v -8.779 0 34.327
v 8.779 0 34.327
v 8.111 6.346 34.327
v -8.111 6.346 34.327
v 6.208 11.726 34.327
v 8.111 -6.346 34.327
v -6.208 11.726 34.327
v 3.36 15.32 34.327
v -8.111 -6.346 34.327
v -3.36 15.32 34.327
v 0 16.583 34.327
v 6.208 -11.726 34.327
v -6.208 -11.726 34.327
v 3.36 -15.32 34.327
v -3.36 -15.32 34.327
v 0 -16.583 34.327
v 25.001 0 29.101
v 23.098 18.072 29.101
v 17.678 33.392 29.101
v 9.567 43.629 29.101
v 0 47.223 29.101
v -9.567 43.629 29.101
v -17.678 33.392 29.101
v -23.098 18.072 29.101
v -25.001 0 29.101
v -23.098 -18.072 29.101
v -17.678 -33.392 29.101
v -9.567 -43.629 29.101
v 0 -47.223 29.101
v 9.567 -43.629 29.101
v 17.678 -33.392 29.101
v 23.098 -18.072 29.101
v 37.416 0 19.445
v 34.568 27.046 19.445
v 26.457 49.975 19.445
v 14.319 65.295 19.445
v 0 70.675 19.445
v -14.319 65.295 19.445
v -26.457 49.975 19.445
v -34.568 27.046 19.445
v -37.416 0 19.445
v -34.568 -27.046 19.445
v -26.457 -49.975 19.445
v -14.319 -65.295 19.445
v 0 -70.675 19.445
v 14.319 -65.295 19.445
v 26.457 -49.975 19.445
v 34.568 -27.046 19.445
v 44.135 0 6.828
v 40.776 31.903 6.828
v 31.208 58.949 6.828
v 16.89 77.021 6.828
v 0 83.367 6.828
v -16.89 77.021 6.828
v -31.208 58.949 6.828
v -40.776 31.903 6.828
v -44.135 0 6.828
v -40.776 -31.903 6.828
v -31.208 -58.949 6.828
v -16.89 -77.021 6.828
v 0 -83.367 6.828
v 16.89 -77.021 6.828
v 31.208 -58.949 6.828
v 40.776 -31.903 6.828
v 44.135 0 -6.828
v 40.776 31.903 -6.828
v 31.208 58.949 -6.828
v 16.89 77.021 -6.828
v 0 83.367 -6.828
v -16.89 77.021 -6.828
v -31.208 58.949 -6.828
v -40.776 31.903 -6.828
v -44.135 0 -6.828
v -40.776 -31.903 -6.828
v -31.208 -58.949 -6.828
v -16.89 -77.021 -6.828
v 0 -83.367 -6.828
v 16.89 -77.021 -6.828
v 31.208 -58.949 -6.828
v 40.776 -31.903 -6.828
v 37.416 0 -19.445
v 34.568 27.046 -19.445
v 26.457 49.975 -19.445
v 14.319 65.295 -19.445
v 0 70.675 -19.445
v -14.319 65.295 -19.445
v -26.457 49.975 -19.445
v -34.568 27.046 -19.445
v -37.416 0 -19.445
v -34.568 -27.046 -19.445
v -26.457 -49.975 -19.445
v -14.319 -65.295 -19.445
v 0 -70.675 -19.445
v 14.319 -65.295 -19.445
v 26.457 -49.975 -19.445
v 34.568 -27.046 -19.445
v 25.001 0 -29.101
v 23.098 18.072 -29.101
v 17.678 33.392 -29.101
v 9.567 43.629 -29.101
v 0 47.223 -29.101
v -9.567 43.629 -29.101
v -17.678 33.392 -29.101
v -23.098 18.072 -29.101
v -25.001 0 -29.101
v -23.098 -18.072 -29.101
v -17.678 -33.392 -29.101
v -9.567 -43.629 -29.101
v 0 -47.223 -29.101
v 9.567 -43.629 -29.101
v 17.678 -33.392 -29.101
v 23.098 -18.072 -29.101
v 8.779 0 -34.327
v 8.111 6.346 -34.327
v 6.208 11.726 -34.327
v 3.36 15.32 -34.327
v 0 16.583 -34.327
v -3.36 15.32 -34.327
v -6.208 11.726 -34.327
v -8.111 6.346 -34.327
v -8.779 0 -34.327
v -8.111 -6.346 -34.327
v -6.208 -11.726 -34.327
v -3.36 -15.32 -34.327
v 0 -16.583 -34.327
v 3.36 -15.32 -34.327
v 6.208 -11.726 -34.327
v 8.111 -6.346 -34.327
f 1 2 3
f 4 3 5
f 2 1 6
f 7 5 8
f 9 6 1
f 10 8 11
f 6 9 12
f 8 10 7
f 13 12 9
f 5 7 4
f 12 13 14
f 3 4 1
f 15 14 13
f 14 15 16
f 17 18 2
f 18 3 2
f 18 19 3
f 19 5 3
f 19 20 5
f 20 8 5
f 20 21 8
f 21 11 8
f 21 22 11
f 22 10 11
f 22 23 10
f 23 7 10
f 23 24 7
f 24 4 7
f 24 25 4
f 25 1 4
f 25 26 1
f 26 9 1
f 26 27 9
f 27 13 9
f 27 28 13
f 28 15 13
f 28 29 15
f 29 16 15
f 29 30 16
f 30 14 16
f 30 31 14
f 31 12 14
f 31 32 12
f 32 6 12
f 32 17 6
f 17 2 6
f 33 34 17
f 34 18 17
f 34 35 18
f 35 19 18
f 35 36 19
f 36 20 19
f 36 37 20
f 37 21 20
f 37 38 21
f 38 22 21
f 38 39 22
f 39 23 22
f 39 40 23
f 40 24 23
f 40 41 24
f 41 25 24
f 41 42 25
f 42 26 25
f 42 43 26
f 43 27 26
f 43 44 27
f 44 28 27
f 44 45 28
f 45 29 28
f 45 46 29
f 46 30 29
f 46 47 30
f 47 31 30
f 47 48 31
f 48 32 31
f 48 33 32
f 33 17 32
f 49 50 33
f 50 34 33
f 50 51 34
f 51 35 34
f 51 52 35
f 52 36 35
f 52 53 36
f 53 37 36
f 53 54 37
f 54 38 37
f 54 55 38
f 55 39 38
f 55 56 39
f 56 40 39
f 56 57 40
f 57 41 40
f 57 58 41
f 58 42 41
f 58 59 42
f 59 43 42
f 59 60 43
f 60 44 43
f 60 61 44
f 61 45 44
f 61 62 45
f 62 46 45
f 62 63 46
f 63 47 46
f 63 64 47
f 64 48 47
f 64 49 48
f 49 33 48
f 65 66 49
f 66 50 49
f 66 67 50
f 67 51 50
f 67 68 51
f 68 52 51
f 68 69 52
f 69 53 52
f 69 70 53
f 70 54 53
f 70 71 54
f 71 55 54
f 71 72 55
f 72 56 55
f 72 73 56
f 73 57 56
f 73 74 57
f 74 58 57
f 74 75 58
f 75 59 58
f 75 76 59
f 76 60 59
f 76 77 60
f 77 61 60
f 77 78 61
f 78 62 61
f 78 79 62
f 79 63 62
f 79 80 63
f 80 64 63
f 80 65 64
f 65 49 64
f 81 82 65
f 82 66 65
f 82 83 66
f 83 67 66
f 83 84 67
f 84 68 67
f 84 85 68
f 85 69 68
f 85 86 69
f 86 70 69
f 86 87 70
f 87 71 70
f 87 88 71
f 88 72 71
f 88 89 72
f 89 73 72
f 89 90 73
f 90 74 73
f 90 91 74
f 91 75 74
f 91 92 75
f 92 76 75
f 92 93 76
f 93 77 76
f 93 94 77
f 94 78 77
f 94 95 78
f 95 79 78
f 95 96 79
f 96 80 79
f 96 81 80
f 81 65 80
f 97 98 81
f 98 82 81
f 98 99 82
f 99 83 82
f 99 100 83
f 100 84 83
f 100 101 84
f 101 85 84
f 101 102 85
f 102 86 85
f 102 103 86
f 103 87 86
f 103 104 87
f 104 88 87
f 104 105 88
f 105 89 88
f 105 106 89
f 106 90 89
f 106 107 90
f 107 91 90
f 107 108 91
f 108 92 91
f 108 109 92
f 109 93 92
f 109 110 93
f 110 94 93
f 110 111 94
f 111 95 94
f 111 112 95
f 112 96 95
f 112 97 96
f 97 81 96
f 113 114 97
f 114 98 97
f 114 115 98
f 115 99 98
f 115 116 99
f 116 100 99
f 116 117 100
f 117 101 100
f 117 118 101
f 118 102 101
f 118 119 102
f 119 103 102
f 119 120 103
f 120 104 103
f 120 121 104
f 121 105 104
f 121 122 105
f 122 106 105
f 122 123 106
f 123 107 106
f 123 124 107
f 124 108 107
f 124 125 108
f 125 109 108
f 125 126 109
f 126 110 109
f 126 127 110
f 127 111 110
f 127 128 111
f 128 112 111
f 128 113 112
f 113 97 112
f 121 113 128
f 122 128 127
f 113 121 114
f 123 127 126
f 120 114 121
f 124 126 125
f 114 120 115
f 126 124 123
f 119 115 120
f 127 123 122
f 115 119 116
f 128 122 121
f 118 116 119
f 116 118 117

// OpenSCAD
// Generated by SolidPython 1.0.1 on 2020-07-29 00:46:49


scale(v = [9, 17, 7]) {
	sphere(r = 5);
}
/***********************************************
*********      SolidPython code:      **********
************************************************
 
# import packages: SolidPython
from solid import *
from solid.utils import *
from itertools import chain, combinations, permutations


class Resize:

    def __init__(self, scad_file):
        self.scad_file = scad_file
        #self.scad_file = import_scad(scad_file)
        # cone/cylinder param:
        self.r1 = 0
        self.r2 = 0
        self.h = 0
        # rectangular prism param:
        self.w = 0
        self.l = 0
        # ellipse param:
        self.r = 0

    # import OpenScad code (file name corresponds to shape)


    # classify shape + parameters
    def assign(self, param1, param2, param3):
        if self.scad_file == 'cone.scad':
            self.r1 = param1
            self.r2 = param2
            self.h = param3
        elif self.scad_file == 'cylinder.scad':
            self.r1 = param1
            self.r2 = param2
            self.h = param3
        elif self.scad_file == 'rectangularPrism.scad':
            self.h = param1
            self.l = param2
            self.w = param3
        else:
            self.r = param1
            self.h = param2

    # resize parameters
    def iterate(self):
        x = range(3, 20, 2)
        i = 1
        if self.scad_file == 'cone.scad':
            tempList = list(permutations(x, 2))
            for temp in tempList:
                param1 = temp[0]
                param2 = temp[1]
                filepath = 'produced_scad_files/' + 'cone' + str(param1) + '_' + str(param2) + '_' + '.scad'
                scad_render_to_file(cylinder(h=param1, r1=param2, r2=0), filepath)

        elif self.scad_file == 'cylinder.scad':
            tempList = list(permutations(x, 3))
            for temp in tempList:
                param1 = temp[0]
                param2 = temp[1]
                filepath = 'produced_scad_files/' + 'cylinder' + str(param1) + '_' + str(param2) + '_' + '.scad'
                scad_render_to_file(cylinder(h=param1, r1=param2, r2=param2), filepath)

        elif self.scad_file == 'rectangularPrism.scad':
            tempList = list(permutations(x, 3))
            for temp in tempList:
                param1 = temp[0]
                param2 = temp[1]
                param3 = temp[2]
                filepath = 'produced_scad_files/' + 'rectangularPrism' + str(param1) + '_' + str(param2) + '_' + str(
                    param3) + '.scad'
                scad_render_to_file(cube(size=(param1, param2, param3)), filepath)

        elif self.scad_file == 'ellipse.scad':
            tempList = list(permutations(x, 4))
            for temp in tempList:
                param1 = temp[0]
                param2 = temp[1]
                param3 = temp[2]
                param4 = temp[3]
                filepath = 'produced_scad_files/' + 'ellipse' + str(param1) + '_' + str(param2) + '_' + str(param3) + '_' + str(param4) + '.scad'
                scad_render_to_file(scale([param1, param2, param3])(sphere(r=param4)), filepath)

    def render_to_scadfile(self):
        scad_render_to_file(scad, 'example.scad') 
 
************************************************/
